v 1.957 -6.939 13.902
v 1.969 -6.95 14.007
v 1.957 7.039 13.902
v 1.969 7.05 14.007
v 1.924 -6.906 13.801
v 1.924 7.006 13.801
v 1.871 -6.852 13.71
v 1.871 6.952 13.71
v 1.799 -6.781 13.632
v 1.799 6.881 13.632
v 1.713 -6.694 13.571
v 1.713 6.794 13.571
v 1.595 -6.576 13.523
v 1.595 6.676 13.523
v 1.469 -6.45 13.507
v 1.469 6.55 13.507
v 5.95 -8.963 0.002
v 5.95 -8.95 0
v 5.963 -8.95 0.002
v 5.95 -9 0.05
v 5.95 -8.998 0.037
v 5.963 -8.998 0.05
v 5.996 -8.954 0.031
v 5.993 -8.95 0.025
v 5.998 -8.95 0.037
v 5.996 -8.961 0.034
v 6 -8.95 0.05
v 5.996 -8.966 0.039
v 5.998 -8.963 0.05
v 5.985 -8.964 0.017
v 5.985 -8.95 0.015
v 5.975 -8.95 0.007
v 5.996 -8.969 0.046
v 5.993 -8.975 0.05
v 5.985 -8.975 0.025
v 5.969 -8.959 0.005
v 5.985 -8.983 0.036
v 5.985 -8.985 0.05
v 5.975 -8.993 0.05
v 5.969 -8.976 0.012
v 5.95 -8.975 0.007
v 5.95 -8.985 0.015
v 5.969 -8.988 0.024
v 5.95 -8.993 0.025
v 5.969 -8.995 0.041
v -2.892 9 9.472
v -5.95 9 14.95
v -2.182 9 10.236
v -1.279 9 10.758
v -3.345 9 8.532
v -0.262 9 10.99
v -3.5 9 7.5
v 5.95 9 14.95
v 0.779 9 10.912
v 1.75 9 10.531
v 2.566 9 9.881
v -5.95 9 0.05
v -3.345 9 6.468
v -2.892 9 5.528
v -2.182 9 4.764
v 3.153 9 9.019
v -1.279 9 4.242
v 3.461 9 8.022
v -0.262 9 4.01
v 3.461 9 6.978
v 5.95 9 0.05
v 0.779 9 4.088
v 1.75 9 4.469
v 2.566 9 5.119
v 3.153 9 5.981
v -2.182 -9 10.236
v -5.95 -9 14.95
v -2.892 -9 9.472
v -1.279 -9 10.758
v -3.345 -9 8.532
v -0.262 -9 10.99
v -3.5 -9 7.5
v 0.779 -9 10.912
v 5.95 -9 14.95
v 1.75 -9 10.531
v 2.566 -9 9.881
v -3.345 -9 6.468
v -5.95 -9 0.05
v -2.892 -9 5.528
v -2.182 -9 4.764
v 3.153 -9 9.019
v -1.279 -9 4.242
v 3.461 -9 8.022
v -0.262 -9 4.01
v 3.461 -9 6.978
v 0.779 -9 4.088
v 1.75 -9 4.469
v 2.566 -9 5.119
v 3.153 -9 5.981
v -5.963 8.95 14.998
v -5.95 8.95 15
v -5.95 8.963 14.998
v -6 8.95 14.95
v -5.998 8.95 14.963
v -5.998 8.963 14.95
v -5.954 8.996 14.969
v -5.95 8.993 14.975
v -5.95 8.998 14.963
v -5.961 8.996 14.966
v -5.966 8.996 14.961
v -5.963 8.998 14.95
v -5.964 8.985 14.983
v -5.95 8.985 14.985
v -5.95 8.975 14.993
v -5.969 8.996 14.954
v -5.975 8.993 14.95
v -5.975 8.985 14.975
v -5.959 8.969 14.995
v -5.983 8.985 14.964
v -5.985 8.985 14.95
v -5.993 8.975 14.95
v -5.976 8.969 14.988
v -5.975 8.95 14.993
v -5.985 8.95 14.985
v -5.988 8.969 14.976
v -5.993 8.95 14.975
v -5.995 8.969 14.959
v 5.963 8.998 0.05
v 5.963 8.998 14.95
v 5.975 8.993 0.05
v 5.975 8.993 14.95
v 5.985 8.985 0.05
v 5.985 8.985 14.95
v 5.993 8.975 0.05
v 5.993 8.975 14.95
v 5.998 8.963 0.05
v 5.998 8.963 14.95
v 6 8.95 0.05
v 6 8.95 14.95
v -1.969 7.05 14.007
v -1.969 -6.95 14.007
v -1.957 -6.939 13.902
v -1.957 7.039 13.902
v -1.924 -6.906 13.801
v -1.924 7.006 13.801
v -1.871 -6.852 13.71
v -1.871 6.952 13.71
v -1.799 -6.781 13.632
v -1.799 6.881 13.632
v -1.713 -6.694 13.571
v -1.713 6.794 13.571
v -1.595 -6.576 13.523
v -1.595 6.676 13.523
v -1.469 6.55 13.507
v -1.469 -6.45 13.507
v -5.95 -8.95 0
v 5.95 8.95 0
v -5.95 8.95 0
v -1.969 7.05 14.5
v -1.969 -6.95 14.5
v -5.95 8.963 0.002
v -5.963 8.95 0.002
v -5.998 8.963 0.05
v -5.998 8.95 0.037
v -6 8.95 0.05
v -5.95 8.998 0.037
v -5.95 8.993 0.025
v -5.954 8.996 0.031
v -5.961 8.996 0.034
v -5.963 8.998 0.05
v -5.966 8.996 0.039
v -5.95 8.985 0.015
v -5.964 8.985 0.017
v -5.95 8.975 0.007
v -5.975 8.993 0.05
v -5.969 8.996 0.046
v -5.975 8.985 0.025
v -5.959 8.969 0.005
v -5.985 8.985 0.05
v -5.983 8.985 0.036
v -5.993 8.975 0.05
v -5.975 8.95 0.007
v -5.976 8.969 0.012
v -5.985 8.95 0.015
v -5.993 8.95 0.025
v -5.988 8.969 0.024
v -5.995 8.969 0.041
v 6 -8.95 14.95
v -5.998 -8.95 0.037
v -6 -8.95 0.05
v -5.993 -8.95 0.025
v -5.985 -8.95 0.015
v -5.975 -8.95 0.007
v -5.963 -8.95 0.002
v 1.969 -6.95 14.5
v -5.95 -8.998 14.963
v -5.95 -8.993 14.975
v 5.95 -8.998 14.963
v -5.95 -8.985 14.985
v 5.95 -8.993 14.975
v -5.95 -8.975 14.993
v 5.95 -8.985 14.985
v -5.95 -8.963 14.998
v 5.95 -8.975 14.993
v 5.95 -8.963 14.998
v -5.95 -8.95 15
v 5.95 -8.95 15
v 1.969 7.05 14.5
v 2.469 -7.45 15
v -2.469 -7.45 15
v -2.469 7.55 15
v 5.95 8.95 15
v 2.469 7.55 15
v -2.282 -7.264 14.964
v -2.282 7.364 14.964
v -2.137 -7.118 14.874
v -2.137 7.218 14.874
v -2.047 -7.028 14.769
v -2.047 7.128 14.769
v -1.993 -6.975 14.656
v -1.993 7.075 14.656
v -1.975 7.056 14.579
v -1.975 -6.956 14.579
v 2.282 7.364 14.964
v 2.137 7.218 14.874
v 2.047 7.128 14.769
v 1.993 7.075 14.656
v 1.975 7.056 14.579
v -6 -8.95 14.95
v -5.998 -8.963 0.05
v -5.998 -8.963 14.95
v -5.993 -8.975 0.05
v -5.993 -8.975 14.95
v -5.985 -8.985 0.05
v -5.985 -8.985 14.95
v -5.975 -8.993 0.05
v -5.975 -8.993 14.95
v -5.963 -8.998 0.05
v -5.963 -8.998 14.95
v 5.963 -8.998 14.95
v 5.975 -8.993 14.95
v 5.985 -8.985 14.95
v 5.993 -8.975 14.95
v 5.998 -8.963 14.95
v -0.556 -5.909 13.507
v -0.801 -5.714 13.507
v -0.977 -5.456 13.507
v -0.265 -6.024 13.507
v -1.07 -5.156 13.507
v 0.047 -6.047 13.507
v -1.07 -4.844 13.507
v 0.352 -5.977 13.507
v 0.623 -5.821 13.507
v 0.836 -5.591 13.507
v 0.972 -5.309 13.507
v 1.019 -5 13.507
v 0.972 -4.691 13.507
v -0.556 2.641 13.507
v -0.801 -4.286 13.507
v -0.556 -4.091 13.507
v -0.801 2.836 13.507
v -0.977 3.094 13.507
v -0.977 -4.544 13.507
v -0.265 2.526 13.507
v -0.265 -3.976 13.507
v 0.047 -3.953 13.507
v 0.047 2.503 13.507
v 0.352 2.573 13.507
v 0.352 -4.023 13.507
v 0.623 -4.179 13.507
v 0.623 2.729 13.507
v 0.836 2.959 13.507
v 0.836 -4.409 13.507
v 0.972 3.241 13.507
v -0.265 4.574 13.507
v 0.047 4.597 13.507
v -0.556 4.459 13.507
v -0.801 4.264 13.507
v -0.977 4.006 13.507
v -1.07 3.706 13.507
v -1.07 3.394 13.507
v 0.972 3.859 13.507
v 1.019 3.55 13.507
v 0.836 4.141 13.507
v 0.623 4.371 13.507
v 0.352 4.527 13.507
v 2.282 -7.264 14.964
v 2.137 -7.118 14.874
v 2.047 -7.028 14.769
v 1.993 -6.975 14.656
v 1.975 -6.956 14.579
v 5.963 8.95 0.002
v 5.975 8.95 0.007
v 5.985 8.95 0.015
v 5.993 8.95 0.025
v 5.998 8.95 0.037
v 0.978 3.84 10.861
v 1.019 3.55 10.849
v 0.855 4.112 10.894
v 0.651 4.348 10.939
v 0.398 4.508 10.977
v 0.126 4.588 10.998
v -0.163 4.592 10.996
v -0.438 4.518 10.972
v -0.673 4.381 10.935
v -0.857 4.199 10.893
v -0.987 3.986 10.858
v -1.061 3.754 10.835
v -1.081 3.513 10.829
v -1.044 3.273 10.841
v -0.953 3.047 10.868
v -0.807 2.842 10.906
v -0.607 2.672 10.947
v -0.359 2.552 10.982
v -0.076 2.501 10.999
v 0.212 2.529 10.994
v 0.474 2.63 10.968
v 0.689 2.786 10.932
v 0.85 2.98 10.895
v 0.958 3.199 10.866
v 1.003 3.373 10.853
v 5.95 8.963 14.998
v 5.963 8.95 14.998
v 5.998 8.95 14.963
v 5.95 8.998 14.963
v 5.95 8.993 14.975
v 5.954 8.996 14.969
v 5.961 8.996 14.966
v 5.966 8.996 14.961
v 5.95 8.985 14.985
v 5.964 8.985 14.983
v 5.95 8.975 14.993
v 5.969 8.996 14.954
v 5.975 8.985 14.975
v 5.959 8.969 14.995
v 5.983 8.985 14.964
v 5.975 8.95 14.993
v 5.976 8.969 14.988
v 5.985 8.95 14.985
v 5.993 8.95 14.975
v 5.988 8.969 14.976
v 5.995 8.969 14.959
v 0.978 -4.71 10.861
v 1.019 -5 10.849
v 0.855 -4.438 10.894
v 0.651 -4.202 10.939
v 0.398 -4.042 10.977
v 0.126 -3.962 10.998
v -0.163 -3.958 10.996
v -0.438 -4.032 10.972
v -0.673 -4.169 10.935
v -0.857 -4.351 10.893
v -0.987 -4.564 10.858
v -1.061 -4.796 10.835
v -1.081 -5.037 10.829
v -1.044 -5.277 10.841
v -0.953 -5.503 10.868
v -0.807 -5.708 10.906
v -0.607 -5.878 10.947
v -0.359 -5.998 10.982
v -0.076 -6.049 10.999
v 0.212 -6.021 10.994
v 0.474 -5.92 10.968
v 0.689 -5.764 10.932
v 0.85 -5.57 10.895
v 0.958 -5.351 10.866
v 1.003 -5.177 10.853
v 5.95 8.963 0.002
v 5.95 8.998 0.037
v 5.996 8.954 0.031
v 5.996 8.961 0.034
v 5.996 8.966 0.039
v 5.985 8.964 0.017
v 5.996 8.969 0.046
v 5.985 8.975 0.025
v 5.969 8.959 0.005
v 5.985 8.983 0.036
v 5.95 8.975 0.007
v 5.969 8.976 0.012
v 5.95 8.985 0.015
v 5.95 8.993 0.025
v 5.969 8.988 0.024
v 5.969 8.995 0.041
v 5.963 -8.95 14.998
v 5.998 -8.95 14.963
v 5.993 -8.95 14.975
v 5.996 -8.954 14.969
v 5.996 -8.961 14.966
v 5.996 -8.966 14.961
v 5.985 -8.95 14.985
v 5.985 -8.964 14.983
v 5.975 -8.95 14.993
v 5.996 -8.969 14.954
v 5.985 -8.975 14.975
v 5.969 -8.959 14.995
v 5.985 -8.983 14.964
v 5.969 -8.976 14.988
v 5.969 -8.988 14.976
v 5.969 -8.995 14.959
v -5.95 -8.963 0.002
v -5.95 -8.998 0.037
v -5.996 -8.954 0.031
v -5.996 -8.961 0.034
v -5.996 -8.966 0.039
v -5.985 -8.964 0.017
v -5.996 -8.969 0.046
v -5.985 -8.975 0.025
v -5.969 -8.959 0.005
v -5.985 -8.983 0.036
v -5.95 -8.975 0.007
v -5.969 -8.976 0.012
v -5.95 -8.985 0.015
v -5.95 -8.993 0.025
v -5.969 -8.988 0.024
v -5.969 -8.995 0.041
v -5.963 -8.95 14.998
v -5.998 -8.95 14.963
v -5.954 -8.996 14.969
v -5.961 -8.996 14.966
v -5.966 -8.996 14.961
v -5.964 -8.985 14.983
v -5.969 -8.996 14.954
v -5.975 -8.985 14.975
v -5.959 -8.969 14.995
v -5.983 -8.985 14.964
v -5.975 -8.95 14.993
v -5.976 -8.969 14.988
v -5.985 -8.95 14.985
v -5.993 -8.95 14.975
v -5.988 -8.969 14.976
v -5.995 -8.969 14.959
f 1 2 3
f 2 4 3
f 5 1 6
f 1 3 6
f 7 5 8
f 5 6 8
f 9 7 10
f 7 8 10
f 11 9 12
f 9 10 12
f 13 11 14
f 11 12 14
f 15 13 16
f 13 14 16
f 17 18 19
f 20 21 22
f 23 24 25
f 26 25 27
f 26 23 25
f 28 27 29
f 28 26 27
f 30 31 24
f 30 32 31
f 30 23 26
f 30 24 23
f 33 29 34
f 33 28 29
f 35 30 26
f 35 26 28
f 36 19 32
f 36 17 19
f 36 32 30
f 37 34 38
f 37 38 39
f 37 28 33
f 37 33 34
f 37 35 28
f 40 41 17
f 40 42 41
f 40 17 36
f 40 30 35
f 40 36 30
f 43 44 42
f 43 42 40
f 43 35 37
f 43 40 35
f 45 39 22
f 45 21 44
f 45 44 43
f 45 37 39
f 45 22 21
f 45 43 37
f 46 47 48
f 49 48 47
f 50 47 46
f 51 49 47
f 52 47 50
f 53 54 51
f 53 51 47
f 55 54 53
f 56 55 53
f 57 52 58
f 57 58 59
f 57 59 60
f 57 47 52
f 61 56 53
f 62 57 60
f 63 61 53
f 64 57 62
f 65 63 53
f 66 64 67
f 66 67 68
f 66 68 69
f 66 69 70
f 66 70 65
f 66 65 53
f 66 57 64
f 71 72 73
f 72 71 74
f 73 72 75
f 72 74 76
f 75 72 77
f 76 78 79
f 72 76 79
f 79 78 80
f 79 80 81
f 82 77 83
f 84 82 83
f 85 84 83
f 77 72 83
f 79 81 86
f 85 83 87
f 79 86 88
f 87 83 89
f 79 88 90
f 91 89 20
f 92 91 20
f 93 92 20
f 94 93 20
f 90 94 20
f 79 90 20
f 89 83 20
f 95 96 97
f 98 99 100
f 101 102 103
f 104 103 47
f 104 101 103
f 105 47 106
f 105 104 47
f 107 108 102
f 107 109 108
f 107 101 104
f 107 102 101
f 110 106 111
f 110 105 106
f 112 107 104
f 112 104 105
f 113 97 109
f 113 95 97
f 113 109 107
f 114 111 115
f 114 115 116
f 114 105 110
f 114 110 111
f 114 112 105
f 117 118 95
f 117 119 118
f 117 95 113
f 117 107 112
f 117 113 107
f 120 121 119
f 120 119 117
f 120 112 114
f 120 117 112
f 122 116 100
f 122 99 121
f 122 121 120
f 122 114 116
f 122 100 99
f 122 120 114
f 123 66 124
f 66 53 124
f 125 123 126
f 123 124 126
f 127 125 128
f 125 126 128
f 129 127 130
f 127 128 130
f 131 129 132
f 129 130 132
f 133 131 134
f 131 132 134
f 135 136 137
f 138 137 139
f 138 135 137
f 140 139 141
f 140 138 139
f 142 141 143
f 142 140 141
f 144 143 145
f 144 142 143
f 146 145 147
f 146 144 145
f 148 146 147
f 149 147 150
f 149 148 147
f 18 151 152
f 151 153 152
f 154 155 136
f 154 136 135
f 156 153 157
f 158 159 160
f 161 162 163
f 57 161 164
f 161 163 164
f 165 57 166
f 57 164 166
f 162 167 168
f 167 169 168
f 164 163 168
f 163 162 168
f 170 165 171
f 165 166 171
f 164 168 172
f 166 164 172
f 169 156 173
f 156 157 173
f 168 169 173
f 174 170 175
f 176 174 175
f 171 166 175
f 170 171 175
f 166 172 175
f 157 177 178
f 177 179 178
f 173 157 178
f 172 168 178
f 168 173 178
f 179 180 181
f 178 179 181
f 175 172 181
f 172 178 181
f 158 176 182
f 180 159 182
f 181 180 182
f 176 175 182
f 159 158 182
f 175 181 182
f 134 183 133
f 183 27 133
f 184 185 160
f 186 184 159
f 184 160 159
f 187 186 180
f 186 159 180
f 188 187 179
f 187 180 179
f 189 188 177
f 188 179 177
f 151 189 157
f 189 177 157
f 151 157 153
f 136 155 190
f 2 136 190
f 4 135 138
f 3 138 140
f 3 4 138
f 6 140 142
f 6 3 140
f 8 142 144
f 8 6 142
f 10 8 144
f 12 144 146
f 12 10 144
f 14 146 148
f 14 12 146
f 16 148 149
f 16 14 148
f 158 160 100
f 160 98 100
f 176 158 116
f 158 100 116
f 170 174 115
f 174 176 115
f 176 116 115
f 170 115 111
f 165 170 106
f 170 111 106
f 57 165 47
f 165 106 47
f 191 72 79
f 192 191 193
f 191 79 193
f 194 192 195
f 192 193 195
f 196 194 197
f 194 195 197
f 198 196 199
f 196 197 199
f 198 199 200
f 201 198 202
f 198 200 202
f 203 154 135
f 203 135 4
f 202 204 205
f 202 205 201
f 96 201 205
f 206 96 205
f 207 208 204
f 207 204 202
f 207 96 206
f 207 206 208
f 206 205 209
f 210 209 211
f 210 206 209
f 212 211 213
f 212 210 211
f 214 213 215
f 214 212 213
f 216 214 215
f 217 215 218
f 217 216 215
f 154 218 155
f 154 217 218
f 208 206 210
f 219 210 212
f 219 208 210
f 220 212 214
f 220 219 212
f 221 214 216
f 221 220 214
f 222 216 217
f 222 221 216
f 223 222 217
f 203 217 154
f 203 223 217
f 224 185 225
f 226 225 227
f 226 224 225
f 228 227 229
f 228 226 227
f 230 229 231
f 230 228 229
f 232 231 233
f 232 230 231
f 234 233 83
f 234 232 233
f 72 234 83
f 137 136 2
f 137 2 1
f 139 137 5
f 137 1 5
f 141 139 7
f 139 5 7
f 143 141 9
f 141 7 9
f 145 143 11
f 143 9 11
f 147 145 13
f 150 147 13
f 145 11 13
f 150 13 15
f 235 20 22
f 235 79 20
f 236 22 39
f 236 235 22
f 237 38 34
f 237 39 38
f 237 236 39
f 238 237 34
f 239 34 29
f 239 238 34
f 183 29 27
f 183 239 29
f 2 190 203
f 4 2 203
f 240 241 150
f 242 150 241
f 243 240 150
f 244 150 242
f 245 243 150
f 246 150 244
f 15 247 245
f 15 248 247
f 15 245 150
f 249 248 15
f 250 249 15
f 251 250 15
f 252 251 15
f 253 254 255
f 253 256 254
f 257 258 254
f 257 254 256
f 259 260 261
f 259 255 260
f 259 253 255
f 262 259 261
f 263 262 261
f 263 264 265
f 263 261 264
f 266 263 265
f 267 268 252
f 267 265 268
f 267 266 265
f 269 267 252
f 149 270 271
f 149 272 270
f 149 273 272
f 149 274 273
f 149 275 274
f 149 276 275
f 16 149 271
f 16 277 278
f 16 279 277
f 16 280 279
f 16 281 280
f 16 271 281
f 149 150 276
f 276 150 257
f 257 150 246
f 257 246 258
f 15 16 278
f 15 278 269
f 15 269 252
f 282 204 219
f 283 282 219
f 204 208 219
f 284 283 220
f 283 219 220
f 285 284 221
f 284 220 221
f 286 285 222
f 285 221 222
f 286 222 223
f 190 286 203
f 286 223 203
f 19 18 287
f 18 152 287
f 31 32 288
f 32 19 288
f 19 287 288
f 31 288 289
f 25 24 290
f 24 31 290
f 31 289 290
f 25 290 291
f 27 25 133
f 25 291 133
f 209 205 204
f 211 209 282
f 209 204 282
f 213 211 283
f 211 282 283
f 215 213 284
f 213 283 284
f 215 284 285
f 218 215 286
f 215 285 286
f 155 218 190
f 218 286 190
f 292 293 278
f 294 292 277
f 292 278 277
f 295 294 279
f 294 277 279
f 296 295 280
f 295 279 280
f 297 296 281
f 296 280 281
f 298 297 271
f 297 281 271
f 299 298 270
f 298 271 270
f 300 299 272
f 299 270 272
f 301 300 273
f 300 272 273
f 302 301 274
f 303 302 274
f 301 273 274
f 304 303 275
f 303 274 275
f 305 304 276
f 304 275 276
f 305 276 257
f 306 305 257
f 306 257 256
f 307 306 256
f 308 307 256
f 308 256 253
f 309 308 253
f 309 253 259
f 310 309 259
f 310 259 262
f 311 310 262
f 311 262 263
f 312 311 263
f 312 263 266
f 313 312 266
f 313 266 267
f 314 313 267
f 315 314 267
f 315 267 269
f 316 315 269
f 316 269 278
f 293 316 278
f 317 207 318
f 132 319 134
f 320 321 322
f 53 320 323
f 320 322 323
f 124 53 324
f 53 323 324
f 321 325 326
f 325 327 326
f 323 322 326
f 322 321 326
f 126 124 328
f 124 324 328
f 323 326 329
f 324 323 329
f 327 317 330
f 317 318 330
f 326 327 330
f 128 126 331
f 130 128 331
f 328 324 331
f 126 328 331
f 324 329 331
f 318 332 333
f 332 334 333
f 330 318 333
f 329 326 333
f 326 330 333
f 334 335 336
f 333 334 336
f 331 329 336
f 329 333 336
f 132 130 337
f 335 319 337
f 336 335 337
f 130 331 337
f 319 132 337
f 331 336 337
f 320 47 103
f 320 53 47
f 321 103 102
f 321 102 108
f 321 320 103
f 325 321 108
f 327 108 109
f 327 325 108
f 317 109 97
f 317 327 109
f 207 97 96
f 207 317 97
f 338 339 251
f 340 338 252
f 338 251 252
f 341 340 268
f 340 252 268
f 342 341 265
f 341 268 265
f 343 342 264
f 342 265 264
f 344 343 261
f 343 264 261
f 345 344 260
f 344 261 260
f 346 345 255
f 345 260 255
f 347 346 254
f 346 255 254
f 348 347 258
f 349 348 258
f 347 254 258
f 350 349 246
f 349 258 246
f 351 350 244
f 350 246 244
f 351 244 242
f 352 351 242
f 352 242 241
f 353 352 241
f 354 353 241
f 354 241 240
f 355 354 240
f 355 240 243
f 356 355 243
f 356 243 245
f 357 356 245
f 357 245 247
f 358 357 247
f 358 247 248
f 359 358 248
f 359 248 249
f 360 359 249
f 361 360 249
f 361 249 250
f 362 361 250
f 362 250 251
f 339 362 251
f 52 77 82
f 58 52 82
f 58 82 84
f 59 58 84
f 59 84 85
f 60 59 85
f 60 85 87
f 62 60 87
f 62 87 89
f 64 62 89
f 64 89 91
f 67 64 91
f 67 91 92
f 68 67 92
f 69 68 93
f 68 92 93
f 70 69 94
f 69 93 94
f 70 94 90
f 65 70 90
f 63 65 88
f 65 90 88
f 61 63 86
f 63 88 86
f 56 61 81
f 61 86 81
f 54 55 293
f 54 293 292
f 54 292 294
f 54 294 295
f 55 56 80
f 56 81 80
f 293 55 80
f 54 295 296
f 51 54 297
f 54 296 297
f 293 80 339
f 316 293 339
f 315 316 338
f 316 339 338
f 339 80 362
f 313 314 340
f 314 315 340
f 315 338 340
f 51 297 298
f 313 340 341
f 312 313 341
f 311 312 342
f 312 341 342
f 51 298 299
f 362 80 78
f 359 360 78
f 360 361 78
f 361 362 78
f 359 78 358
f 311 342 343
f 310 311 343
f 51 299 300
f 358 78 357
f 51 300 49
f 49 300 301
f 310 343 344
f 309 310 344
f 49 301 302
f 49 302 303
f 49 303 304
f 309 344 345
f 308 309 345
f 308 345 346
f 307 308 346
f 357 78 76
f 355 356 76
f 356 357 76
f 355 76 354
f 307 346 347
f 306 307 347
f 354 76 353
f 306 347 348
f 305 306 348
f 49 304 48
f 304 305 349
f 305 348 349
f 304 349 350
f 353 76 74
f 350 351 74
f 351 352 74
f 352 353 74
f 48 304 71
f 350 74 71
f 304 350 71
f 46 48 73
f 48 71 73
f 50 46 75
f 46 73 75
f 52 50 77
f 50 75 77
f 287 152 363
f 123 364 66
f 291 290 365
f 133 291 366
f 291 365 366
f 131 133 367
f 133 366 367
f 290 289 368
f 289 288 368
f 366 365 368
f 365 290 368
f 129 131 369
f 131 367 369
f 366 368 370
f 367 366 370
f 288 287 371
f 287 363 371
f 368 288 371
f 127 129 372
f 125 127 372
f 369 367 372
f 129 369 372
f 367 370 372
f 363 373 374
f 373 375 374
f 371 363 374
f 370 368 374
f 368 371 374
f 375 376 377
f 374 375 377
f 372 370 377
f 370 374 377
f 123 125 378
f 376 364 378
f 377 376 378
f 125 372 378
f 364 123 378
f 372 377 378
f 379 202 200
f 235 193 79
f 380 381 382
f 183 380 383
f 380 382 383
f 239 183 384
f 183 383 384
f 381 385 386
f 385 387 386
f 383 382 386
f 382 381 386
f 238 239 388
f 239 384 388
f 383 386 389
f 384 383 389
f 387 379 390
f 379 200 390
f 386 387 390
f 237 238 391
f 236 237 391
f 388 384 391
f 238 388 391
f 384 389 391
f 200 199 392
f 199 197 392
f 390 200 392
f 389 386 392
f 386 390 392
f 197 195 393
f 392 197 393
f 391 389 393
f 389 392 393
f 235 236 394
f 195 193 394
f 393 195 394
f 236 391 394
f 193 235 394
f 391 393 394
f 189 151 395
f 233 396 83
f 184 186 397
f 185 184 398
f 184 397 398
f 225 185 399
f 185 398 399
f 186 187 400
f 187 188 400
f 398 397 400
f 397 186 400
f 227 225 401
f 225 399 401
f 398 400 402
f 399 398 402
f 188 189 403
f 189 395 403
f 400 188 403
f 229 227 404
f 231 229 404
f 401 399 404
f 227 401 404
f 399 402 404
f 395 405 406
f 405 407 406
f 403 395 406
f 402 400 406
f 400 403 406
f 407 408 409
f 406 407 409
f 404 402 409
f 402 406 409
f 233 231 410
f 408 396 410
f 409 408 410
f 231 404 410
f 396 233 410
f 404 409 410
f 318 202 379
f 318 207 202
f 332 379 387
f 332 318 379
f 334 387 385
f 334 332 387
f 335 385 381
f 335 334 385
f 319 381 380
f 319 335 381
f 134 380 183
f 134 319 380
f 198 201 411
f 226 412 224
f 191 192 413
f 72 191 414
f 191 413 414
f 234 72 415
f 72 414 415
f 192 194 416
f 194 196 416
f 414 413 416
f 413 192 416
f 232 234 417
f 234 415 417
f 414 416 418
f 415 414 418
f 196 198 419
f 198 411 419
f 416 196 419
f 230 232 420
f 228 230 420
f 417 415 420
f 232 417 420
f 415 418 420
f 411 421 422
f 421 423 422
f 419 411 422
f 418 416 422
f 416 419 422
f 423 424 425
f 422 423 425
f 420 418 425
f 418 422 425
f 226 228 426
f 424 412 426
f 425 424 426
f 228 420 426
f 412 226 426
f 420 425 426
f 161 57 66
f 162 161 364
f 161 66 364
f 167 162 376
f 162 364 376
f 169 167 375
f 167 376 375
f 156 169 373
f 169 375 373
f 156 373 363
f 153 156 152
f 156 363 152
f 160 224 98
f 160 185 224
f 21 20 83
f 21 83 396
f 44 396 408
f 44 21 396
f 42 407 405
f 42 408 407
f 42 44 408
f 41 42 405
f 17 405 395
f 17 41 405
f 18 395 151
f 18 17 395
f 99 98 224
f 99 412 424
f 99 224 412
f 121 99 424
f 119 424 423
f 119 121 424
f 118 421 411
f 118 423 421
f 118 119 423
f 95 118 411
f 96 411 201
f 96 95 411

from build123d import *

# Parameters (mm, degrees)
SKETCH2_W           = 12
SKETCH2_H           = 18
BOSS_EXTRUDE1_DEPTH = 15
SKETCH5_R           = 3.5
CUT_EXTRUDE2_DEPTH  = 18
SKETCH8_W           = 3.937037176
SKETCH8_H           = 14
CUT_EXTRUDE3_DEPTH  = 1.492750999
FILLET3_R           = 0.05
SKETCH10_R          = 1.05
CUT_EXTRUDE6_DEPTH  = 3
FILLET9_R           = 0.5
FILLET10_R          = 0.5


with BuildPart() as part:
    # Sketch2 → Boss-Extrude1 (new body)
    with BuildSketch(Plane.XY):
        Rectangle(SKETCH2_W, SKETCH2_H)
    extrude(amount=BOSS_EXTRUDE1_DEPTH)

    # Sketch5 → Cut-Extrude2 (cut)
    with BuildSketch(Plane(origin=(0, -9, 0), x_dir=(-1, 0, 0), z_dir=(0, -1, 0))):
        with Locations((0, -7.5)):
            Circle(SKETCH5_R)
    extrude(amount=-CUT_EXTRUDE2_DEPTH, mode=Mode.SUBTRACT)

    # Sketch8 → Cut-Extrude3 (cut)
    with BuildSketch(Plane.XY.offset(15)):
        with Locations((0, 0.05)):
            Rectangle(SKETCH8_W, SKETCH8_H)
    extrude(amount=-CUT_EXTRUDE3_DEPTH, mode=Mode.SUBTRACT)

    # Fillet3
    fillet3_edges = [part.edges().sort_by_distance(p)[0] for p in [
        (-6, 0, 15),
        (0, -9, 15),
        (6, 0, 15),
        (0, -9, 0),
        (-6, 0, 0),
        (0, 9, 0),
        (6, 0, 0),
        (0, 9, 15),
        (6, -9, 7.5),
        (-6, -9, 7.5),
        (-6, 9, 7.5),
        (6, 9, 7.5),
    ]]
    fillet(fillet3_edges, radius=FILLET3_R)

    # Sketch10 → Cut-Extrude6 (cut)
    with BuildSketch(Plane.XY.offset(13.507249001)):
        with Locations((-0.031481412, 3.55)):
            Circle(SKETCH10_R)
        with Locations((-0.031481412, -5)):
            Circle(SKETCH10_R)
    extrude(amount=-CUT_EXTRUDE6_DEPTH, mode=Mode.SUBTRACT)

    # Fillet9
    fillet9_edges = [part.edges().sort_by_distance(p)[0] for p in [
        (-1.968518588, 0.05, 15),
        (0, -6.95, 15),
        (1.968518588, 0.05, 15),
        (0, 7.05, 15),
    ]]
    fillet(fillet9_edges, radius=FILLET9_R)

    # Fillet10
    fillet10_edges = [part.edges().sort_by_distance(p)[0] for p in [
        (-1.968518588, 0.05, 13.507249001),
        (0, 7.05, 13.507249001),
        (1.968518588, 0.05, 13.507249001),
        (0, -6.95, 13.507249001),
    ]]
    fillet(fillet10_edges, radius=FILLET10_R)


solid = part.part
